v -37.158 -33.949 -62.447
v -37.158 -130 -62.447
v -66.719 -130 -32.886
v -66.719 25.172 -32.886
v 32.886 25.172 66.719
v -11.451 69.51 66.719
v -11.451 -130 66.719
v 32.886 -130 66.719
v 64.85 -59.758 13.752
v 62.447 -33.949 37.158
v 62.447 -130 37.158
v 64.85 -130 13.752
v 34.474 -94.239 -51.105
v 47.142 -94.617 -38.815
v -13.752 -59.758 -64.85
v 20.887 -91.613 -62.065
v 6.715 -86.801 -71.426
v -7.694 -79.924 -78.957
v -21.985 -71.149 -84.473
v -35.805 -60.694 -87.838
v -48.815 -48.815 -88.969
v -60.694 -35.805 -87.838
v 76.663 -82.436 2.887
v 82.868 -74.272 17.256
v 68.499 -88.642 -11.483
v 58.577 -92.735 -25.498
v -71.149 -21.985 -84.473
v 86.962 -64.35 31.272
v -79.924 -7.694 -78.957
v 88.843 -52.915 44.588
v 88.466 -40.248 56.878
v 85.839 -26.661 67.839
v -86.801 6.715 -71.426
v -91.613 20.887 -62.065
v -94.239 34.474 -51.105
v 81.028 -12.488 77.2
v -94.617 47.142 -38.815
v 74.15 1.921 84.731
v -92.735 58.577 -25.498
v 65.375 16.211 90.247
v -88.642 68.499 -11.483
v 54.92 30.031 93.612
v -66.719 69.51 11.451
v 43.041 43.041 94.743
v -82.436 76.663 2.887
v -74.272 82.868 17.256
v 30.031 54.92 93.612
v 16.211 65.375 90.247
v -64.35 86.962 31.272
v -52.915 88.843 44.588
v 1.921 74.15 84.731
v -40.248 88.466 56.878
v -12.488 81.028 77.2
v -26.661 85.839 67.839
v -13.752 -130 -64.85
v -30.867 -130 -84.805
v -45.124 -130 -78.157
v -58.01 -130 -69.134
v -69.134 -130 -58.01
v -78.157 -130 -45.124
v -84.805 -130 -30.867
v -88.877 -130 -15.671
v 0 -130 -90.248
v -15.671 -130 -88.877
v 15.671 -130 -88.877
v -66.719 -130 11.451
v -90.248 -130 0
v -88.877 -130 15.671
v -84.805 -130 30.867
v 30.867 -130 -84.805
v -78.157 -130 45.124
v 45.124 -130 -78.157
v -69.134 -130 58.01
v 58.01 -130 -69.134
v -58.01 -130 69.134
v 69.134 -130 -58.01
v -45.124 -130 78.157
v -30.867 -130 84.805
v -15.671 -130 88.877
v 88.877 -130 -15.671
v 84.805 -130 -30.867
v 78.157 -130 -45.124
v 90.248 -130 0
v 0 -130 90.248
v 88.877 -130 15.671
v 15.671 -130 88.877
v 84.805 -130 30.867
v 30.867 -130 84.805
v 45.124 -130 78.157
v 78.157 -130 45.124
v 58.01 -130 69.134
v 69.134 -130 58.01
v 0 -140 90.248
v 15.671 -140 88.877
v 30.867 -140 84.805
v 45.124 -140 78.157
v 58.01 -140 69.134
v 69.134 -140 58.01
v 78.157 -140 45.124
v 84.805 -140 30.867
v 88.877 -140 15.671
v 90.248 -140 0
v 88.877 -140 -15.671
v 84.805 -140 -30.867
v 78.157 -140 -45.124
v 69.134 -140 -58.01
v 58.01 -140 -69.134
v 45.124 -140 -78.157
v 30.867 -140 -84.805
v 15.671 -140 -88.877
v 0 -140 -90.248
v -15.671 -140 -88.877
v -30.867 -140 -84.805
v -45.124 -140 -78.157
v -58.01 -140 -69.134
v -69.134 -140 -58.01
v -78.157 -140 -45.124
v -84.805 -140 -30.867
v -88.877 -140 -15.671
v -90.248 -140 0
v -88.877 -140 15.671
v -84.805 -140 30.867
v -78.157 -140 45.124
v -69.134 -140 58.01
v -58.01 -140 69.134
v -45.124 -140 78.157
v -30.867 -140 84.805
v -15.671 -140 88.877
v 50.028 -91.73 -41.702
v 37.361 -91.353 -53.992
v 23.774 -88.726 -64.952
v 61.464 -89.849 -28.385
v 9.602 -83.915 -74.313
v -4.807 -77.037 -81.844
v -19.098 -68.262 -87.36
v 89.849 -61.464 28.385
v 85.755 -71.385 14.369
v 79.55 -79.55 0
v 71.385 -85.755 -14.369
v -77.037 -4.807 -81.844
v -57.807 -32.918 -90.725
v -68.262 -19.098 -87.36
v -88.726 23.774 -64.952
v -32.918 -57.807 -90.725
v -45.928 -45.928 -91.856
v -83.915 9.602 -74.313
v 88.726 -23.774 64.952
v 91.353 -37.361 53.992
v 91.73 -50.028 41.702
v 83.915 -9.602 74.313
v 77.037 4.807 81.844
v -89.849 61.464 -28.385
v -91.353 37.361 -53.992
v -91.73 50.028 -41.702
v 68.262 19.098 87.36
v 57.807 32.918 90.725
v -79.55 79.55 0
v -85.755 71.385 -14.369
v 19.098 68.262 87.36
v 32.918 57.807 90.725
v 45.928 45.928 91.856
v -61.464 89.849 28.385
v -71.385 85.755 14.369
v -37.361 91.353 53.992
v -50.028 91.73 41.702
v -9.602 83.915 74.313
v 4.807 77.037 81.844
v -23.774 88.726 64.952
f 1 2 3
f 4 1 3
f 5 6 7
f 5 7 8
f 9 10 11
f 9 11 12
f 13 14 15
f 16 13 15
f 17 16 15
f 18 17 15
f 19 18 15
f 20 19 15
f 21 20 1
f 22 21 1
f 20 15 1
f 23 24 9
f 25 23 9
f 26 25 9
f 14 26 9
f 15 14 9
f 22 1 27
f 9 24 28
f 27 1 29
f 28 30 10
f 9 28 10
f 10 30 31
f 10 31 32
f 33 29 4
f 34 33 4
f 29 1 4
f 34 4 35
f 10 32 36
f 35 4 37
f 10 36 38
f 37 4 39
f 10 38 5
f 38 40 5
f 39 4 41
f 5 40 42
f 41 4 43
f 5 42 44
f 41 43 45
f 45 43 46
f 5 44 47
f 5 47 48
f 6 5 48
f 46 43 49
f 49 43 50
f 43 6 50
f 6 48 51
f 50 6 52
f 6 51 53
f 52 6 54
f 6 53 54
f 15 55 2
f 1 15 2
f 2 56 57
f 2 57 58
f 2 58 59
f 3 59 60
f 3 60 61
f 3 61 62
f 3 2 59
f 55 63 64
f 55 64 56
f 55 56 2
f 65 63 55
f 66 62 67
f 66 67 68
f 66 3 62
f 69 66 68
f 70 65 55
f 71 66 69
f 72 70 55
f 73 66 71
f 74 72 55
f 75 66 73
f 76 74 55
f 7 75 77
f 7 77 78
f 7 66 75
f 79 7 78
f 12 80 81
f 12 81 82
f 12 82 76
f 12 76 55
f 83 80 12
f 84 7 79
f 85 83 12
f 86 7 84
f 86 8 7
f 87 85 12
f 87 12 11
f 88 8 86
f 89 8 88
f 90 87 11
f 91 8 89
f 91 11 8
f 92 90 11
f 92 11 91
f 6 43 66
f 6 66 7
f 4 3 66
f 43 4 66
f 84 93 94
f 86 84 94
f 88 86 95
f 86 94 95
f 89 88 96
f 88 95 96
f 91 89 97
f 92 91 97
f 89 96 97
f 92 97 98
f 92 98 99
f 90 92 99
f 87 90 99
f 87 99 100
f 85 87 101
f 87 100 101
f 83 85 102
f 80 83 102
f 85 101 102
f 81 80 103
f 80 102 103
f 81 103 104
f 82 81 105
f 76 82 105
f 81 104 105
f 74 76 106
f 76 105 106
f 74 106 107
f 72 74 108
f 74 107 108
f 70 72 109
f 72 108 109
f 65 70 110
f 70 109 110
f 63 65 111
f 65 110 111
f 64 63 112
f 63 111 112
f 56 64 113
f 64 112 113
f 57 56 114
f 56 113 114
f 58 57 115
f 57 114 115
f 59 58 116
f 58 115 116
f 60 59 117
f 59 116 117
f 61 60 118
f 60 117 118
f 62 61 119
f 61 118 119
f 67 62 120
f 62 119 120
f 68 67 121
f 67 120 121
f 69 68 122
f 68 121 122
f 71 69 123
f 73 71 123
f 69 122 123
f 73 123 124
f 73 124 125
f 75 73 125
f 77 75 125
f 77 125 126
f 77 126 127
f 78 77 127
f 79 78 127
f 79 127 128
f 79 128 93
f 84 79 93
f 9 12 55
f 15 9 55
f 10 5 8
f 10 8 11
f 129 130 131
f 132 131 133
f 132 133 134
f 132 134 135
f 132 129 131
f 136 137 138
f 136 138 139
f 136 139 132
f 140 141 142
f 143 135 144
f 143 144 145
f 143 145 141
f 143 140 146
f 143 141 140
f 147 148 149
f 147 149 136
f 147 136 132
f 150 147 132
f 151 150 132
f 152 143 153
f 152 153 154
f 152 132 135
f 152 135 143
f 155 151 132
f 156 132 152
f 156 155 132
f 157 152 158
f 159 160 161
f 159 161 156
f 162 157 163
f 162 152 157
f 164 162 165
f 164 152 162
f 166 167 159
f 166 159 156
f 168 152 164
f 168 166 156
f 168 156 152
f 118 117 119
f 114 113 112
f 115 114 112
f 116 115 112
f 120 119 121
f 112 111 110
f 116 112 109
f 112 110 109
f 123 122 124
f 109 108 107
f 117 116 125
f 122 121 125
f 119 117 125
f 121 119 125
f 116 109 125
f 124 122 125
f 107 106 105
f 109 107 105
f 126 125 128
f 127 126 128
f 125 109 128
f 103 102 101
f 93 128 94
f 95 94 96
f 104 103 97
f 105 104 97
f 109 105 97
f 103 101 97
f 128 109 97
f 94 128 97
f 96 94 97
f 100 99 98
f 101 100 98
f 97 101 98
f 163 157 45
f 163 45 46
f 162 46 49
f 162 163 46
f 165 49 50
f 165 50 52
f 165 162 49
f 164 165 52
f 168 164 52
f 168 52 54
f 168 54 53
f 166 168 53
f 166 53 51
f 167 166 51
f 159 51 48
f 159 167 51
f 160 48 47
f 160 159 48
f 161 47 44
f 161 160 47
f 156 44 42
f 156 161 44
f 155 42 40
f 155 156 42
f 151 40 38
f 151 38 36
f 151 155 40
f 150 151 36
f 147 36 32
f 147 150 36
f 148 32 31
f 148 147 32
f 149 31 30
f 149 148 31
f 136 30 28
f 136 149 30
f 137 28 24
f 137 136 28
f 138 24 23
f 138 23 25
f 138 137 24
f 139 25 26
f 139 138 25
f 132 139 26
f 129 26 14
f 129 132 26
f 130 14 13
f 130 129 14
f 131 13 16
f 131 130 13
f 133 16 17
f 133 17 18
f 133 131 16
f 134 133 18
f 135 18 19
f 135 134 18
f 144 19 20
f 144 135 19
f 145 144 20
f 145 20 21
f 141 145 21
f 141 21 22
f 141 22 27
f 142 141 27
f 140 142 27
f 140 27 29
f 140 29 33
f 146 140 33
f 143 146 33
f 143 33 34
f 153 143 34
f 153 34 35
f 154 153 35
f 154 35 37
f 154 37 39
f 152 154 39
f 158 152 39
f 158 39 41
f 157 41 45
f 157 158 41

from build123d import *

# Parameters (mm, degrees)
SKETCH_3_R      = 112.5
EXTRUDE_5_DEPTH = 5
EXTRUDE_1_REACH = 465.242
SKETCH_8_R      = 90.24770546
EXTRUDE_2_DEPTH = 10


with BuildPart() as part:
    # 草图3 → 凸台-拉伸5 (new body)
    with BuildSketch(Plane(origin=(0, 0, 0), x_dir=(-0.4082482904638631, -0.40824829046386274, -0.8164965809277263), z_dir=(0.5773502691896261, 0.5773502691896257, -0.5773502691896256))):
        Circle(SKETCH_3_R)
    extrude(amount=-EXTRUDE_5_DEPTH)

    # 凸台-拉伸1: up to this plane
    extrude_1_end = Plane(origin=(-2.886751346, -2.886751346, 2.886751346), z_dir=(0.5773502691896261, 0.5773502691896257, -0.5773502691896256))
    # 草图5 → 凸台-拉伸1 (add, up to the surface)
    with BuildSketch(Plane(origin=(0, -140, 0), x_dir=(1, 0, 0), z_dir=(0, 1, 0)), mode=Mode.PRIVATE) as extrude_1_sk1:
        Polygon((-37.158068765, 62.446542524), (-66.718597501, 32.886013788), (-66.718597501, -11.451165298), (-11.451165298, -66.718597501), (32.886013788, -66.718597501), (62.446542524, -37.158068765), (64.849763198, -13.752243339), (-13.752243339, 64.849763198), align=None)
    extrude_1_tool1 = split(extrude(extrude_1_sk1.sketch, amount=EXTRUDE_1_REACH, mode=Mode.PRIVATE), bisect_by=extrude_1_end, keep=Keep.BOTH, mode=Mode.PRIVATE)
    add(extrude_1_tool1.solids().sort_by_distance((-5.313204, -140, 5.313204))[0])

    # 草图8 → 凸台-拉伸2 (add)
    with BuildSketch(Plane(origin=(0, -140, 0), x_dir=(1, 0, 0), z_dir=(0, 1, 0))):
        Circle(SKETCH_8_R)
    extrude(amount=EXTRUDE_2_DEPTH)


solid = part.part
